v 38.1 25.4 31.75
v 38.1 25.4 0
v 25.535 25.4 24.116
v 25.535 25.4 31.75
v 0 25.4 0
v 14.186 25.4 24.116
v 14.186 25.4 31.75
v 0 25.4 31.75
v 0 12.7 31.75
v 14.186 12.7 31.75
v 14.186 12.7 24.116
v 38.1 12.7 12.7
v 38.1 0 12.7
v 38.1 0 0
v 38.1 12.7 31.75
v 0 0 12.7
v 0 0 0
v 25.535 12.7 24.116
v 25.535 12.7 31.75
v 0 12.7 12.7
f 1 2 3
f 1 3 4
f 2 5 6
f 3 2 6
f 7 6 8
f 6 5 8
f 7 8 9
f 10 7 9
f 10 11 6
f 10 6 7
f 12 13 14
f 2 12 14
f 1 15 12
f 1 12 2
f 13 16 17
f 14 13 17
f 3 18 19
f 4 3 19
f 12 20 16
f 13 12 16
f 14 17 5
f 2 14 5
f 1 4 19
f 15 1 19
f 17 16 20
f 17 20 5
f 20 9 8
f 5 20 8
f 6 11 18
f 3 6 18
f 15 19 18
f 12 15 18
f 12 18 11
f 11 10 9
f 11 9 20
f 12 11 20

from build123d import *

# Parameters (mm, degrees)
F1_DEPTH = 38.1
F2_W     = 11.3489339128
F2_H     = 7.6335099638
F3_DEPTH = 6.35
F4_DEPTH = 12.7


with BuildPart() as f1:
    # F0 (on Right) → F1 (new body)
    with BuildSketch(Plane.YZ):
        Polygon((0, 12.7), (0, 0), (25.4, 0), (25.4, 31.75), (12.7, 31.75), (12.7, 12.7), align=None)
    extrude(amount=F1_DEPTH)

    # F2 (on face) → F3 (cut)
    with BuildSketch(Plane.XZ.offset(-12.7)):
        with Locations((19.8606378399, 27.9332450181)):
            Rectangle(F2_W, F2_H)
    extrude(amount=-F3_DEPTH, mode=Mode.SUBTRACT)

    # F4 (cut): a face of the model
    f4_faces = [f1.faces().sort_by_distance(p)[0] for p in [
        (19.8606378399, 19.05, 27.9332450181),
    ]]
    extrude(f4_faces, amount=-F4_DEPTH, mode=Mode.SUBTRACT)


solid = f1.part
